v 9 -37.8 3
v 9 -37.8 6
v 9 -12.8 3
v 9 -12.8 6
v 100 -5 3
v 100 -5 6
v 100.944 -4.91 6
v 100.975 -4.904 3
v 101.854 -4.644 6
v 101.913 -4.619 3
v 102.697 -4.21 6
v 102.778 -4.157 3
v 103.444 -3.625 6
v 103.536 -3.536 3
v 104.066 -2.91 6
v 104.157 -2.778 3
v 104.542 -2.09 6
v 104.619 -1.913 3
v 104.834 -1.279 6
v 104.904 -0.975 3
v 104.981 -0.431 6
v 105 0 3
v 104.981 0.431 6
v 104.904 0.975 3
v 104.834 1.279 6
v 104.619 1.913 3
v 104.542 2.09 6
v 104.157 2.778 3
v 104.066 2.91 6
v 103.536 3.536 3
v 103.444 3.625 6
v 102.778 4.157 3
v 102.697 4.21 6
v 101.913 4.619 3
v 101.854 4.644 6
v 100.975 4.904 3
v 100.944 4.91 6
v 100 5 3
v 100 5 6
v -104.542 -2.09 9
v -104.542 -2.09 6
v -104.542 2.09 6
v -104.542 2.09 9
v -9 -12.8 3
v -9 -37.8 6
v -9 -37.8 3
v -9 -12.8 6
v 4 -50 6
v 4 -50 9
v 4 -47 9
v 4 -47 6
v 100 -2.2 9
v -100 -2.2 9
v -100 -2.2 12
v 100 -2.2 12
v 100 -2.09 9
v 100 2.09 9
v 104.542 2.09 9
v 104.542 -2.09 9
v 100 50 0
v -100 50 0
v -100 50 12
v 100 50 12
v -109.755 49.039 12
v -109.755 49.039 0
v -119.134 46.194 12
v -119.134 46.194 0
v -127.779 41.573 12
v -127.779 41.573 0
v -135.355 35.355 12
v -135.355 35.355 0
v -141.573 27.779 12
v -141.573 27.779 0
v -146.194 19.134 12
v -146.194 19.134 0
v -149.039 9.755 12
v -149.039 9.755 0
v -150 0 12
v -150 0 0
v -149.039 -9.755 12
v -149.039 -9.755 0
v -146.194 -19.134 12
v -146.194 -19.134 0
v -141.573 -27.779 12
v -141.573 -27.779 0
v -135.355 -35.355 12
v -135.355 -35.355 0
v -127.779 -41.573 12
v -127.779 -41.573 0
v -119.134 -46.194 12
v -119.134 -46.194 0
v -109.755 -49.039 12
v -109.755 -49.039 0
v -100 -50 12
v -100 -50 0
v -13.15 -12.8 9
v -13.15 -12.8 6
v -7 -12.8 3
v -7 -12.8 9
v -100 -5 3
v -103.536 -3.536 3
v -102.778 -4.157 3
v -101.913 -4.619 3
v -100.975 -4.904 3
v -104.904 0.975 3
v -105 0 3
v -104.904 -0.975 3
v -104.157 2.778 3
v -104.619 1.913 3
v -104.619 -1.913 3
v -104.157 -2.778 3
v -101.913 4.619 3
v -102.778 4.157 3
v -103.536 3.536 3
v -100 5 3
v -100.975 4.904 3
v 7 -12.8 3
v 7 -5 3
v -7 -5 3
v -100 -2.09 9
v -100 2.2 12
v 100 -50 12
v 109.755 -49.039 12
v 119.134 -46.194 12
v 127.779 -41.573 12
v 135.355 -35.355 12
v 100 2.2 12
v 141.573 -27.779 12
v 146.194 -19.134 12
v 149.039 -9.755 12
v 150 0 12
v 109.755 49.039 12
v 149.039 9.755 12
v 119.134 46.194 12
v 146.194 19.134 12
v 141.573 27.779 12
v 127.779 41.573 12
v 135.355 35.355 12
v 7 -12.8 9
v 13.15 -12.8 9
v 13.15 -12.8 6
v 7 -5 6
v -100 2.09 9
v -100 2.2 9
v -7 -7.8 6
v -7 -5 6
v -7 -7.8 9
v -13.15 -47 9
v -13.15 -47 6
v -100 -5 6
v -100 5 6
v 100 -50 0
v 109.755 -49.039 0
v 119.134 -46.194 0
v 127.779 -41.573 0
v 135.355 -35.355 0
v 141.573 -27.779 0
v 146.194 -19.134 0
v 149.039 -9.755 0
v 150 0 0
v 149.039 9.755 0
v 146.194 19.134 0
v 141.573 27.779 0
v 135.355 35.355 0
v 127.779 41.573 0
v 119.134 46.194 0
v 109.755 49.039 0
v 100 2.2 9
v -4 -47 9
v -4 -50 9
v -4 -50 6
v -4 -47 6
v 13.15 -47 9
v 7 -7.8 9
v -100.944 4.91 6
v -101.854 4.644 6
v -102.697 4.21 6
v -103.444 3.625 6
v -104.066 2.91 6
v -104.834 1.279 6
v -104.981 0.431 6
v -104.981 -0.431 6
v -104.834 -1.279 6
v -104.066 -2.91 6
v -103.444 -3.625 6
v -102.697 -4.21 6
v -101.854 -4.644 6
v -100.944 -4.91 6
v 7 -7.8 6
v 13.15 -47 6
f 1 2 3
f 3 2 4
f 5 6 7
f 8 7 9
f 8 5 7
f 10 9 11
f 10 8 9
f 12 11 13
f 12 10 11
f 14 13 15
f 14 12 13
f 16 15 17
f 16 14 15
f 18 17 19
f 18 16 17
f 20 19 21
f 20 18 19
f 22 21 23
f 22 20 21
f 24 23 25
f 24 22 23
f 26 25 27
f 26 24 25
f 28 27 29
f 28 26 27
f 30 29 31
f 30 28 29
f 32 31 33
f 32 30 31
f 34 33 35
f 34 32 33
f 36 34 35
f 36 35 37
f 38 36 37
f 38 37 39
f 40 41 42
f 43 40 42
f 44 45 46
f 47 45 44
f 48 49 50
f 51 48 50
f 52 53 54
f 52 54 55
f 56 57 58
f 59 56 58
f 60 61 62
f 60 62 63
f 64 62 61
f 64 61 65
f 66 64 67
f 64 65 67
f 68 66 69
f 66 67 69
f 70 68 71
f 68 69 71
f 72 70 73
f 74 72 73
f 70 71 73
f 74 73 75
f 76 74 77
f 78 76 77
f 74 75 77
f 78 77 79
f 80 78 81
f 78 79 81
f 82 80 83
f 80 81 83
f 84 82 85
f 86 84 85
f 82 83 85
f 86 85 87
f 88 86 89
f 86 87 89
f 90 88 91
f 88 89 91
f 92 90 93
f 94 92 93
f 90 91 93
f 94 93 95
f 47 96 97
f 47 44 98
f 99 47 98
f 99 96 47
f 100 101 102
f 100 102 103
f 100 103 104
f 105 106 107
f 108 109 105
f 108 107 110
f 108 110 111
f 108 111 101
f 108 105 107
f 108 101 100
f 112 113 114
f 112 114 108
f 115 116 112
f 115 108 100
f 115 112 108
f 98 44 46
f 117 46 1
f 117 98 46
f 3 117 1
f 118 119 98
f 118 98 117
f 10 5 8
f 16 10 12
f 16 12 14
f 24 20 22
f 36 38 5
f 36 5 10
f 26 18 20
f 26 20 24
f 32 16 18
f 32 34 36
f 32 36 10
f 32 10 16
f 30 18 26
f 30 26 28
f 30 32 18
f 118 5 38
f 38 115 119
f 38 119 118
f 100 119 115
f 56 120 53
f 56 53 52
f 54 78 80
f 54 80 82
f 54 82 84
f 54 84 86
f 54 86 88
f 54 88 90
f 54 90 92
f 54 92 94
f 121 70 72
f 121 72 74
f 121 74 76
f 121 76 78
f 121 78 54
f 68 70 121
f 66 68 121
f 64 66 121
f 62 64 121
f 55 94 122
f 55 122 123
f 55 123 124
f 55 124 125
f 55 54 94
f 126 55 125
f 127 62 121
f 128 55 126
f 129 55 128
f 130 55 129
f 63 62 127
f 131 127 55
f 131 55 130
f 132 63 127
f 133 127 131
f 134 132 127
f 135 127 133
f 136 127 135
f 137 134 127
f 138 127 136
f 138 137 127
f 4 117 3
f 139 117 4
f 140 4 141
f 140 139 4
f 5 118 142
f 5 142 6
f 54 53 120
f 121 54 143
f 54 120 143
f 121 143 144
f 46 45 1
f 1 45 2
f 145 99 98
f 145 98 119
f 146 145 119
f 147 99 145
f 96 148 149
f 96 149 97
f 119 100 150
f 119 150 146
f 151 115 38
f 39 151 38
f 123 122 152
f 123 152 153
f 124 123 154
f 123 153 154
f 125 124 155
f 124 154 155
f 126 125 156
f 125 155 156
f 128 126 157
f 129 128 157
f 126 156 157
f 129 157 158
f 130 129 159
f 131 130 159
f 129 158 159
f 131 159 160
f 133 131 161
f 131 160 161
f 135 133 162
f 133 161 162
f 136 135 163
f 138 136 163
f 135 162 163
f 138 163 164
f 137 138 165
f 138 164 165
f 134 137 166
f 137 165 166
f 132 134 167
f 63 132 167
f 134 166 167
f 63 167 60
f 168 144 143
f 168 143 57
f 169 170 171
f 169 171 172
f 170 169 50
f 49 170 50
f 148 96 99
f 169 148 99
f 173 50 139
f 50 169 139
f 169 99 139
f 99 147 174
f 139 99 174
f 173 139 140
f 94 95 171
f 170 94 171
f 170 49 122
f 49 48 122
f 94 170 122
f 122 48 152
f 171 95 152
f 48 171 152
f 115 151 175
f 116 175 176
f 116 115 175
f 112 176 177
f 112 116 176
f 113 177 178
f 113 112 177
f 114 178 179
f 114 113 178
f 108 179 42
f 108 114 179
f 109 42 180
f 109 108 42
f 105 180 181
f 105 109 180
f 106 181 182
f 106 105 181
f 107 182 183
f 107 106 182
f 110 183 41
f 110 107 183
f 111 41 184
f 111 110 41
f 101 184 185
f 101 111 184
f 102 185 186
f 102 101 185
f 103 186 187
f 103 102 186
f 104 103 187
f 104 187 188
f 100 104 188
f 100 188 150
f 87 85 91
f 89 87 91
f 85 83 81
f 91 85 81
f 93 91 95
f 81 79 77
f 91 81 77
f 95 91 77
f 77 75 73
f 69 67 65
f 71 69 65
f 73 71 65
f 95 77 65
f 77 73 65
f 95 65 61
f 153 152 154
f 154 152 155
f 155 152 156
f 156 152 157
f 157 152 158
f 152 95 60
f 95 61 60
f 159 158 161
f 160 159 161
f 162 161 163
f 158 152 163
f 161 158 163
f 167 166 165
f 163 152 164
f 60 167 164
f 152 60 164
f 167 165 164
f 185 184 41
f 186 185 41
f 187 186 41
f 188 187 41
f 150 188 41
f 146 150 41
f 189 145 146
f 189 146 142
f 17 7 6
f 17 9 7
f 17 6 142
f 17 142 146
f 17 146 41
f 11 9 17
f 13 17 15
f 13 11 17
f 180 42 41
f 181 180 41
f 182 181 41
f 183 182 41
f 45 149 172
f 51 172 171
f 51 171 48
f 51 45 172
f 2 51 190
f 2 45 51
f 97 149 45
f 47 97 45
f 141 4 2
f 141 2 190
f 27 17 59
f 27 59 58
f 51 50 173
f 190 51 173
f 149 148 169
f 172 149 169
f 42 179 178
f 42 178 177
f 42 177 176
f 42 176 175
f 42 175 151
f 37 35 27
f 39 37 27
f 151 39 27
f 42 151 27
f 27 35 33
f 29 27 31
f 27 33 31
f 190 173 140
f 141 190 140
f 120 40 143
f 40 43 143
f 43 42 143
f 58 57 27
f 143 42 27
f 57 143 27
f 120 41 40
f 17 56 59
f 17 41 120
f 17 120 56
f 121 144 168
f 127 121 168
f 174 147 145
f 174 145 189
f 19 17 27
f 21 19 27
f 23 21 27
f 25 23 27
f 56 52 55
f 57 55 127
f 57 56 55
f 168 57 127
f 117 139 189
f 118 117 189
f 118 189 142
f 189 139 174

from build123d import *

# Parameters (mm, degrees)
PAD_DEPTH       = 3
PAD001_DEPTH    = 3
SKETCH002_W     = 209.08447
SKETCH002_H     = 4.18
PAD002_DEPTH    = 3
SKETCH003_W     = 26.3
SKETCH003_H     = 34.2
POCKET_DEPTH    = 3
SKETCH004_W     = 18
SKETCH004_H     = 25
POCKET001_DEPTH = 3
SKETCH005_W     = 14
SKETCH005_H     = 5
POCKET002_DEPTH = 6
SKETCH006_W     = 14
SKETCH006_H     = 3
POCKET003_DEPTH = 3
SKETCH007_W     = 8
SKETCH007_H     = 3
POCKET004_DEPTH = 3
SKETCH008_W     = 200
SKETCH008_H     = 4.4
PAD003_DEPTH    = 3


with BuildPart() as part:
    # Sketch → Pad (new body)
    with BuildSketch(Plane.XY):
        with BuildLine():
            ThreePointArc((-100, 50), (-150, 0), (-100, -50))
            Line((-100, -50), (100, -50))
            ThreePointArc((100, -50), (150, 0), (100, 50))
            Line((-100, 50), (100, 50))
        make_face()
    extrude(amount=PAD_DEPTH)

    # Sketch001 (on Face6 of Pad) → Pad001 (join)
    with BuildSketch(Plane.XY.offset(3)):
        with BuildLine():
            ThreePointArc((-100, 50), (-150, 0), (-100, -50))
            Line((-100, -50), (100, -50))
            ThreePointArc((100, -50), (150, 0), (100, 50))
            Line((-100, 50), (100, 50))
        make_face()
        with BuildLine():
            ThreePointArc((-100, 5), (-105, 0), (-100, -5))
            Line((-100, -5), (100, -5))
            ThreePointArc((100, -5), (105, 0), (100, 5))
            Line((-100, 5), (100, 5))
        make_face(mode=Mode.SUBTRACT)
    extrude(amount=PAD001_DEPTH)

    # Sketch002 (on Face9 of Pad001) → Pad002 (join)
    with BuildSketch(Plane.XY.offset(6)):
        with BuildLine():
            ThreePointArc((-100, 50), (-150, 0), (-100, -50))
            Line((-100, -50), (100, -50))
            ThreePointArc((100, -50), (150, 0), (100, 50))
            Line((-100, 50), (100, 50))
        make_face()
        Rectangle(SKETCH002_W, SKETCH002_H, mode=Mode.SUBTRACT)
    extrude(amount=PAD002_DEPTH)

    # Sketch003 (on Face13 of Pad002) → Pocket (cut)
    with BuildSketch(Plane.XY.offset(9)):
        with Locations((0, -29.9)):
            Rectangle(SKETCH003_W, SKETCH003_H)
    extrude(amount=-POCKET_DEPTH, mode=Mode.SUBTRACT)

    # Sketch004 (on Face27 of Pocket) → Pocket001 (cut)
    with BuildSketch(Plane.XY.offset(6)):
        with Locations((0, -25.3)):
            Rectangle(SKETCH004_W, SKETCH004_H)
    extrude(amount=-POCKET001_DEPTH, mode=Mode.SUBTRACT)

    # Sketch005 (on Face13 of Pocket001) → Pocket002 (cut)
    with BuildSketch(Plane.XY.offset(9)):
        with Locations((0, -10.3)):
            Rectangle(SKETCH005_W, SKETCH005_H)
    extrude(amount=-POCKET002_DEPTH, mode=Mode.SUBTRACT)

    # Sketch006 (on Face23 of Pocket002) → Pocket003 (cut)
    with BuildSketch(Plane.XZ.offset(7.8)):
        with Locations((0, 4.5)):
            Rectangle(SKETCH006_W, SKETCH006_H)
    extrude(amount=-POCKET003_DEPTH, mode=Mode.SUBTRACT)

    # Sketch007 (on Face13 of Pocket003) → Pocket004 (cut)
    with BuildSketch(Plane.XY.offset(9)):
        with Locations((0, -48.5)):
            Rectangle(SKETCH007_W, SKETCH007_H)
    extrude(amount=-POCKET004_DEPTH, mode=Mode.SUBTRACT)

    # Sketch008 (on Face15 of Pocket004) → Pad003 (join)
    with BuildSketch(Plane.XY.offset(9)):
        with BuildLine():
            ThreePointArc((-100, 50), (-150, 0), (-100, -50))
            Line((-100, -50), (100, -50))
            ThreePointArc((100, -50), (150, 0), (100, 50))
            Line((-100, 50), (100, 50))
        make_face()
        Rectangle(SKETCH008_W, SKETCH008_H, mode=Mode.SUBTRACT)
    extrude(amount=PAD003_DEPTH)


solid = part.part
